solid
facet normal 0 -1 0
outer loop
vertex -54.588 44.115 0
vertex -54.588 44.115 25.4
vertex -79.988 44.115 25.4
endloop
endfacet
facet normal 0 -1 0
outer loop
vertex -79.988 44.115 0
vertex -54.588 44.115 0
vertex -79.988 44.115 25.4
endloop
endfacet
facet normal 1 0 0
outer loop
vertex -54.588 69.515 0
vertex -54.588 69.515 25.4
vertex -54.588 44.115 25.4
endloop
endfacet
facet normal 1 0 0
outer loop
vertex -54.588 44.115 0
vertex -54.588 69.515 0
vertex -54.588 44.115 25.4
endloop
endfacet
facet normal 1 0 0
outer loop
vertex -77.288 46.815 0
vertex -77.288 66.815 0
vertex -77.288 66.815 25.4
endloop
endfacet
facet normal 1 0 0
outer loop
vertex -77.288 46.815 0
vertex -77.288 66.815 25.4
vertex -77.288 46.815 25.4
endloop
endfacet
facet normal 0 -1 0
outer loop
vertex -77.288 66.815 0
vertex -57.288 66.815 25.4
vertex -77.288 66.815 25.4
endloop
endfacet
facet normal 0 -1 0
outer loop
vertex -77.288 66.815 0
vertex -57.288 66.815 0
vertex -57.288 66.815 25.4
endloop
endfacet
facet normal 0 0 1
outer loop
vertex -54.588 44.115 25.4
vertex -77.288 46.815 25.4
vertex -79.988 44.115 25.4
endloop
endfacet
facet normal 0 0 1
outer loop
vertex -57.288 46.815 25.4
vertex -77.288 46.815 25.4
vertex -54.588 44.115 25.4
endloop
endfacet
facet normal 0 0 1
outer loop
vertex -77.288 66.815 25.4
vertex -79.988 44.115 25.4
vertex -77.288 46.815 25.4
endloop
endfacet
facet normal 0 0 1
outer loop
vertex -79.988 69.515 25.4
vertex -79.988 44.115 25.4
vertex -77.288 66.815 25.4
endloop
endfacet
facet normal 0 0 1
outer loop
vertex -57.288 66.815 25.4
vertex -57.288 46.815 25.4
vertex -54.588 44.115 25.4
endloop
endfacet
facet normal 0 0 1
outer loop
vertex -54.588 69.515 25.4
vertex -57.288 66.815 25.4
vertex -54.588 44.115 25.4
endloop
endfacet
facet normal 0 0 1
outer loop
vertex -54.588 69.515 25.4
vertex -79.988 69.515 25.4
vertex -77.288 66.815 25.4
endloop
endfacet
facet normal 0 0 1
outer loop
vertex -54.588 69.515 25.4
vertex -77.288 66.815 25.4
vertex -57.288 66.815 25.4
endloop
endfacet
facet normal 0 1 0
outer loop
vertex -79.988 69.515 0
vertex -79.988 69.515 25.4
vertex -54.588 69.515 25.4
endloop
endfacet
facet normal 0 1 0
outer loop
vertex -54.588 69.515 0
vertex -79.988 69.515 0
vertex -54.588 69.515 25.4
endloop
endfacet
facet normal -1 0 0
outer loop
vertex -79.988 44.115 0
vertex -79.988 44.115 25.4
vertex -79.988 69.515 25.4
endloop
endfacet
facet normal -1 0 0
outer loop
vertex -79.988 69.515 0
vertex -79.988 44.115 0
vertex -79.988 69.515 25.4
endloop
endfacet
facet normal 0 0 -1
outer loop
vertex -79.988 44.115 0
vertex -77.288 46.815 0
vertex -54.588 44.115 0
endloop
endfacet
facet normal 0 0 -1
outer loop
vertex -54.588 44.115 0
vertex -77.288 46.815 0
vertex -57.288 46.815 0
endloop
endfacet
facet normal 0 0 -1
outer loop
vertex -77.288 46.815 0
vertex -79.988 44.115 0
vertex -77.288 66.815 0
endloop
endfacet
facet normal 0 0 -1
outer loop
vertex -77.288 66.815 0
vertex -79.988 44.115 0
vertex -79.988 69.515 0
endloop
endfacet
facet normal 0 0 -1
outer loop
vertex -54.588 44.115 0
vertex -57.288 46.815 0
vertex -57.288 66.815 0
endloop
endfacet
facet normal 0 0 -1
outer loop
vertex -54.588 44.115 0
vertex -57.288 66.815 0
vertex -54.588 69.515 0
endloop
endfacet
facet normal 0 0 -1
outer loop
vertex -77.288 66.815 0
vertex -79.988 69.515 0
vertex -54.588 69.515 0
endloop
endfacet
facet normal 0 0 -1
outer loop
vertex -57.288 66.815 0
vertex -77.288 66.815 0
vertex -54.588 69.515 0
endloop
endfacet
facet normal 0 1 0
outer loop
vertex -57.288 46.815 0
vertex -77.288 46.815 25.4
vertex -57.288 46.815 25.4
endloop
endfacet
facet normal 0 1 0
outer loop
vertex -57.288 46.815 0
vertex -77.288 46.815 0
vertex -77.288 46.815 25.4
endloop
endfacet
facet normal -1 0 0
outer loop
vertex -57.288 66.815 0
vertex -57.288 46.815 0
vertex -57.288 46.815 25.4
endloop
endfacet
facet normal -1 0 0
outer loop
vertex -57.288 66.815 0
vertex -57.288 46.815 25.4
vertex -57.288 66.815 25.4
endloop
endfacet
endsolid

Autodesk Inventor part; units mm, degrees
ref_plane "YZ Plane" through (0, 0, 0) normal (1, 0, 0) x (0, 1, 0)
ref_plane "XZ Plane" through (0, 0, 0) normal (0, 1, 0) x (-1, 0, 0)
ref_plane "XY Plane" through (0, 0, 0) normal (0, 0, 1) x (1, 0, 0)
ref_plane "Work Plane1" through (0, 0, 0) normal (0, 0, 1) x (1, 0, 0)
sketch "Sketch1" plane through (0, 0, 0) normal (0, 0, 1) x (1, 0, 0)
  circle A0 centre (-25.4098, 20.8167) radius 8 projected
  circle A1 centre (-109.1654, 20.8167) radius 8 projected
  circle A2 centre (-67.2876, 20.8167) radius 11.5 projected
  line L0 (-56.2876, 67.31) -> (-56.2876, 59.315) projected
  line L1 (-56.2876, 59.315) -> (-61.2876, 59.315) projected
  line L2 (-61.2876, 59.315) -> (-56.2876, 54.315) projected
  line L3 (-56.2876, 54.315) -> (-56.2876, 45.32) projected
  line L4 (-56.2876, 45.32) -> (-64.2876, 45.32) projected
  line L5 (-64.2876, 51.32) -> (-64.2876, 45.32) projected
  line L6 (-70.2876, 51.32) -> (-64.2876, 51.32) projected
  line L7 (-70.2876, 45.32) -> (-70.2876, 51.32) projected
  line L8 (-70.2876, 45.32) -> (-78.2876, 45.32) projected
  line L9 (-78.2876, 45.32) -> (-78.2876, 54.315) projected
  line L10 (-78.2876, 54.315) -> (-73.2876, 59.315) projected
  line L11 (-73.2876, 59.315) -> (-78.2876, 59.315) projected
  line L12 (-78.2876, 59.315) -> (-78.2876, 67.31) projected
  line L13 (-78.2876, 67.31) -> (-105.9385, 67.31) projected
  line L14 (-105.9385, 67.31) -> (-141.1337, 6.35) projected
  line L15 (-141.1337, 6.35) -> (-9.2697, 6.35) projected
  line L16 (-9.2697, 6.35) -> (-9.2697, 67.31) projected
  line L17 (-9.2697, 67.31) -> (-56.2876, 67.31) projected
  circle A3 centre (-109.1654, 20.8167) radius 8 projected
  circle A4 centre (-25.4098, 20.8167) radius 8 projected
  circle A5 centre (-67.2876, 20.8167) radius 11.5 projected
  line L18 (-77.2876, 46.815) -> (-57.2876, 46.815)
  line L19 (-57.2876, 46.815) -> (-57.2876, 66.815)
  line L20 (-57.2876, 66.815) -> (-77.2876, 66.815)
  line L21 (-77.2876, 66.815) -> (-77.2876, 46.815)
  line L22 (-77.2876, 46.815) -> (-57.2876, 66.815) construction
  line L23 (-57.2876, 46.815) -> (-77.2876, 66.815) construction
  line L24 (-79.9876, 69.515) -> (-54.5876, 69.515)
  line L25 (-54.5876, 69.515) -> (-54.5876, 44.115)
  line L26 (-54.5876, 44.115) -> (-79.9876, 44.115)
  line L27 (-79.9876, 44.115) -> (-79.9876, 69.515)
  line L28 (-79.9876, 69.515) -> (-54.5876, 44.115) construction
  line L29 (-54.5876, 69.515) -> (-79.9876, 44.115) construction
  point P0 (0, 0)
  point P1 (-67.2876, 56.815)
  dimension "d0" = 20
  dimension "d1" = 20
  dimension "d2" = 25.4
  dimension "d3" = 25.4
extrude "Extrusion1" add sketch "Sketch1" along normal blind 25.4 contours L17 L25 L26 L27 L13 L12 L11 L21 L10 L9 L8 L7 L18 L5 L4 L3 L2 L19 L1 L0 | L0 L1 L19 L20 L21 L11 L12 L13 L27 L24 L25 L17 | L2 L3 L4 L5 L18 L19 | L7 L8 L9 L10 L21 L18
sketch "Sketch2" plane through (0, 0, 25.4) normal (0, 0, 1) x (1, 0, 0)
  line L0 (-56.2876, 67.31) -> (-56.2876, 59.315) projected
  line L1 (-56.2876, 59.315) -> (-61.2876, 59.315) projected
  line L2 (-61.2876, 59.315) -> (-56.2876, 54.315) projected
  line L3 (-56.2876, 54.315) -> (-56.2876, 45.32) projected
  line L4 (-56.2876, 45.32) -> (-64.2876, 45.32) projected
  line L5 (-64.2876, 51.32) -> (-64.2876, 45.32) projected
  line L6 (-70.2876, 51.32) -> (-64.2876, 51.32) projected
  line L7 (-70.2876, 45.32) -> (-70.2876, 51.32) projected
  line L8 (-70.2876, 45.32) -> (-78.2876, 45.32) projected
  line L9 (-78.2876, 45.32) -> (-78.2876, 54.315) projected
  line L10 (-78.2876, 54.315) -> (-73.2876, 59.315) projected
  line L11 (-73.2876, 59.315) -> (-78.2876, 59.315) projected
  line L12 (-78.2876, 59.315) -> (-78.2876, 67.31) projected
  line L13 (-78.2876, 67.31) -> (-105.9385, 67.31) projected
  line L14 (-105.9385, 67.31) -> (-141.1337, 6.35) projected
  line L15 (-141.1337, 6.35) -> (-9.2697, 6.35) projected
  line L16 (-9.2697, 6.35) -> (-9.2697, 67.31) projected
  line L17 (-9.2697, 67.31) -> (-56.2876, 67.31) projected
  circle A0 centre (-109.1654, 20.8167) radius 8 projected
  circle A1 centre (-25.4098, 20.8167) radius 8 projected
  circle A2 centre (-67.2876, 20.8167) radius 11.5 projected
  circle A3 centre (-25.4098, 20.8167) radius 4
  point P0 (0, 0)
  dimension "d6" = 8
properties part number "Right X End"
